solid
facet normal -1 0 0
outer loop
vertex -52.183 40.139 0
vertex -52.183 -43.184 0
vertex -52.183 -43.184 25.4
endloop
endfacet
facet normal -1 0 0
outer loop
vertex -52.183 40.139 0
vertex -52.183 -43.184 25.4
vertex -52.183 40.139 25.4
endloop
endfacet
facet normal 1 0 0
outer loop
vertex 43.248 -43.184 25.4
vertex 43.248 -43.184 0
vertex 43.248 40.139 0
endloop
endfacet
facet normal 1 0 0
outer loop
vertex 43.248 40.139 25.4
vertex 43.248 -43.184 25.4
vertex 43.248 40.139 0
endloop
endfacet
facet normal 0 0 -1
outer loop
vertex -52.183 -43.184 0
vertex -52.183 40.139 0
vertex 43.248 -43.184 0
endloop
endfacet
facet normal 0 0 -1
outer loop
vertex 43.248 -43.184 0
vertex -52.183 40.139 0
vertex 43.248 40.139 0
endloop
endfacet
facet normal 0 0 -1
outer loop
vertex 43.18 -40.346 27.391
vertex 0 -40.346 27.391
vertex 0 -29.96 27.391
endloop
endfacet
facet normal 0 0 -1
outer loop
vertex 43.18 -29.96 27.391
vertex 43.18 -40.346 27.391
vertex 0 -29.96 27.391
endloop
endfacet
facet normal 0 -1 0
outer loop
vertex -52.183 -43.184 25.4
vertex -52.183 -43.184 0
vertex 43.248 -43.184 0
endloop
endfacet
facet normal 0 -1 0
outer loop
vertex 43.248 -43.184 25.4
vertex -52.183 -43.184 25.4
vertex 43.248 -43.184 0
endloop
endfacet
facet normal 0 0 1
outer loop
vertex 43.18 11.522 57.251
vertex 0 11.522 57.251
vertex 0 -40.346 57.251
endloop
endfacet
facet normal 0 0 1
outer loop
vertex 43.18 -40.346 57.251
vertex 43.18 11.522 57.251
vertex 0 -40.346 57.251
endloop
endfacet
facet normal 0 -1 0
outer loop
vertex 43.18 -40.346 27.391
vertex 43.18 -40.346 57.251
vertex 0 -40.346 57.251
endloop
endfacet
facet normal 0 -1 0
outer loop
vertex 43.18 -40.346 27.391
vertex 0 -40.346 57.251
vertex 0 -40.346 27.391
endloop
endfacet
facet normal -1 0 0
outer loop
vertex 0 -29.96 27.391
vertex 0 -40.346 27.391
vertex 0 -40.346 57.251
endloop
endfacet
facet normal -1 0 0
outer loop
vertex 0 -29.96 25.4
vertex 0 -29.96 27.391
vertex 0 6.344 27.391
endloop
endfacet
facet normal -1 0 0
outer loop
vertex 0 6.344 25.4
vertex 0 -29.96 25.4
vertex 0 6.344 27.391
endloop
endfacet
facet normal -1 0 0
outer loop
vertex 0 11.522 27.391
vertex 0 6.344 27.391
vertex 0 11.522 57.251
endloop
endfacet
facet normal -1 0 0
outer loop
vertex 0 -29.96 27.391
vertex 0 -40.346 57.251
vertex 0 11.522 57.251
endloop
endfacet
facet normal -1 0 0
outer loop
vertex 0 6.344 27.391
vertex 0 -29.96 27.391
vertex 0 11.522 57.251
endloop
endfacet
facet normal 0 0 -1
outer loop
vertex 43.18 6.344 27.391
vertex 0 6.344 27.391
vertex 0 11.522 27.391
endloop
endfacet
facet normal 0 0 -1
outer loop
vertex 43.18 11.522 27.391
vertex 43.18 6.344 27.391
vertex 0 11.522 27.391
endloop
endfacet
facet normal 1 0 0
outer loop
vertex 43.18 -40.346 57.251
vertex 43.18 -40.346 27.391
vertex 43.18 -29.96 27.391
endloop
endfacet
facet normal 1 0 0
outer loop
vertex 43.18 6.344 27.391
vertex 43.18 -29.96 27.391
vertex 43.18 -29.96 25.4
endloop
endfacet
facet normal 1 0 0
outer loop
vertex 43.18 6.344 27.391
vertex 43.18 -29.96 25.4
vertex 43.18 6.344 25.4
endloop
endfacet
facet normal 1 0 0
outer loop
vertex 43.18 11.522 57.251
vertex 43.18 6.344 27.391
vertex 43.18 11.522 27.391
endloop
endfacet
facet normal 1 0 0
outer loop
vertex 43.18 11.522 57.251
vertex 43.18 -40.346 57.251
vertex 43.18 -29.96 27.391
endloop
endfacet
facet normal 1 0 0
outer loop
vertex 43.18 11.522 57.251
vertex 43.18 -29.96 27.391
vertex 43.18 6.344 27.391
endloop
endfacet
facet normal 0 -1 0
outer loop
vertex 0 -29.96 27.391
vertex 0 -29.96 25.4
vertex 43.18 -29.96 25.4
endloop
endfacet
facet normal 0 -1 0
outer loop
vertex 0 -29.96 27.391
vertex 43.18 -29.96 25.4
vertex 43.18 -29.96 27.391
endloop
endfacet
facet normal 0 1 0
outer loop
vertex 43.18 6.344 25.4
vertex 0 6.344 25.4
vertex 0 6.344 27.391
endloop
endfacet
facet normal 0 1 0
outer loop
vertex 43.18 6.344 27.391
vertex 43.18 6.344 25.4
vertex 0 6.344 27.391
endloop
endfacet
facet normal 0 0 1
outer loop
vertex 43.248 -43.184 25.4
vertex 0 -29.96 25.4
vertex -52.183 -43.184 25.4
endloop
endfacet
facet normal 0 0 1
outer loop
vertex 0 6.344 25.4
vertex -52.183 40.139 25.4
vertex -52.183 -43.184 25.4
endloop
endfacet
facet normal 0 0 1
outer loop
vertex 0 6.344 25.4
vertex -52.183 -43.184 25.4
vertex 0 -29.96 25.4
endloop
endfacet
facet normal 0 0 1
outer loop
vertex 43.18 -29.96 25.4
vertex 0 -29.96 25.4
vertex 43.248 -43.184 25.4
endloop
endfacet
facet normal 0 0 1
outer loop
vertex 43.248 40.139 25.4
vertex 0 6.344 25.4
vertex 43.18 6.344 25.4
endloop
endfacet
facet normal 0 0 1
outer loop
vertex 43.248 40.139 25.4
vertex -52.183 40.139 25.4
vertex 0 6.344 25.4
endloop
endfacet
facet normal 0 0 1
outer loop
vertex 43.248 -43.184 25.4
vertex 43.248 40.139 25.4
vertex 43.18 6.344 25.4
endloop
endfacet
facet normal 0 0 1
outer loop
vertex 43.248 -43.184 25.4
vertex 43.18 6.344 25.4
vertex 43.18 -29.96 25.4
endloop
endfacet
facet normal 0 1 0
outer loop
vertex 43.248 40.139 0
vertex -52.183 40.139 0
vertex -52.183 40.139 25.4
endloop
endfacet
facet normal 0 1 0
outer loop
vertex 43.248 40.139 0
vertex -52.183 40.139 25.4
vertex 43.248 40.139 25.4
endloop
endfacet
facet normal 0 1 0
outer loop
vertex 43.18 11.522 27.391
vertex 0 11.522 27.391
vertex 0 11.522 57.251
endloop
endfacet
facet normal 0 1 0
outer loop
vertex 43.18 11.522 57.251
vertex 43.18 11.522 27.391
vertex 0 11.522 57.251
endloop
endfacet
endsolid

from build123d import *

# Parameters (mm, degrees)
F0_W     = 95.4314470291
F0_H     = 83.3230912685
F1_DEPTH = 25.4
F2_W     = 36.3040966913
F2_H     = 16.6404070333
F3_DEPTH = 43.18


with BuildPart() as f1:
    # F0 (on Top) → F1 (new body)
    with BuildSketch(Plane.XY):
        with Locations((-4.4675134122, -1.5228800476)):
            Rectangle(F0_W, F0_H)
    extrude(amount=F1_DEPTH)

    # F2 (on Right) → F3 (join)
    with BuildSketch(Plane.YZ):
        Polygon((-40.3462946415, 57.2510994971), (-40.3462946415, 27.3906495422), (-29.9596916884, 27.3906495422), (6.3444050029, 27.3906495422), (11.5222530439, 27.3906495422), (11.5222530439, 57.2510994971), align=None)
        with Locations((-11.8076433428, 19.0704460256)):
            Rectangle(F2_W, F2_H)
    extrude(amount=F3_DEPTH)


solid = f1.part
